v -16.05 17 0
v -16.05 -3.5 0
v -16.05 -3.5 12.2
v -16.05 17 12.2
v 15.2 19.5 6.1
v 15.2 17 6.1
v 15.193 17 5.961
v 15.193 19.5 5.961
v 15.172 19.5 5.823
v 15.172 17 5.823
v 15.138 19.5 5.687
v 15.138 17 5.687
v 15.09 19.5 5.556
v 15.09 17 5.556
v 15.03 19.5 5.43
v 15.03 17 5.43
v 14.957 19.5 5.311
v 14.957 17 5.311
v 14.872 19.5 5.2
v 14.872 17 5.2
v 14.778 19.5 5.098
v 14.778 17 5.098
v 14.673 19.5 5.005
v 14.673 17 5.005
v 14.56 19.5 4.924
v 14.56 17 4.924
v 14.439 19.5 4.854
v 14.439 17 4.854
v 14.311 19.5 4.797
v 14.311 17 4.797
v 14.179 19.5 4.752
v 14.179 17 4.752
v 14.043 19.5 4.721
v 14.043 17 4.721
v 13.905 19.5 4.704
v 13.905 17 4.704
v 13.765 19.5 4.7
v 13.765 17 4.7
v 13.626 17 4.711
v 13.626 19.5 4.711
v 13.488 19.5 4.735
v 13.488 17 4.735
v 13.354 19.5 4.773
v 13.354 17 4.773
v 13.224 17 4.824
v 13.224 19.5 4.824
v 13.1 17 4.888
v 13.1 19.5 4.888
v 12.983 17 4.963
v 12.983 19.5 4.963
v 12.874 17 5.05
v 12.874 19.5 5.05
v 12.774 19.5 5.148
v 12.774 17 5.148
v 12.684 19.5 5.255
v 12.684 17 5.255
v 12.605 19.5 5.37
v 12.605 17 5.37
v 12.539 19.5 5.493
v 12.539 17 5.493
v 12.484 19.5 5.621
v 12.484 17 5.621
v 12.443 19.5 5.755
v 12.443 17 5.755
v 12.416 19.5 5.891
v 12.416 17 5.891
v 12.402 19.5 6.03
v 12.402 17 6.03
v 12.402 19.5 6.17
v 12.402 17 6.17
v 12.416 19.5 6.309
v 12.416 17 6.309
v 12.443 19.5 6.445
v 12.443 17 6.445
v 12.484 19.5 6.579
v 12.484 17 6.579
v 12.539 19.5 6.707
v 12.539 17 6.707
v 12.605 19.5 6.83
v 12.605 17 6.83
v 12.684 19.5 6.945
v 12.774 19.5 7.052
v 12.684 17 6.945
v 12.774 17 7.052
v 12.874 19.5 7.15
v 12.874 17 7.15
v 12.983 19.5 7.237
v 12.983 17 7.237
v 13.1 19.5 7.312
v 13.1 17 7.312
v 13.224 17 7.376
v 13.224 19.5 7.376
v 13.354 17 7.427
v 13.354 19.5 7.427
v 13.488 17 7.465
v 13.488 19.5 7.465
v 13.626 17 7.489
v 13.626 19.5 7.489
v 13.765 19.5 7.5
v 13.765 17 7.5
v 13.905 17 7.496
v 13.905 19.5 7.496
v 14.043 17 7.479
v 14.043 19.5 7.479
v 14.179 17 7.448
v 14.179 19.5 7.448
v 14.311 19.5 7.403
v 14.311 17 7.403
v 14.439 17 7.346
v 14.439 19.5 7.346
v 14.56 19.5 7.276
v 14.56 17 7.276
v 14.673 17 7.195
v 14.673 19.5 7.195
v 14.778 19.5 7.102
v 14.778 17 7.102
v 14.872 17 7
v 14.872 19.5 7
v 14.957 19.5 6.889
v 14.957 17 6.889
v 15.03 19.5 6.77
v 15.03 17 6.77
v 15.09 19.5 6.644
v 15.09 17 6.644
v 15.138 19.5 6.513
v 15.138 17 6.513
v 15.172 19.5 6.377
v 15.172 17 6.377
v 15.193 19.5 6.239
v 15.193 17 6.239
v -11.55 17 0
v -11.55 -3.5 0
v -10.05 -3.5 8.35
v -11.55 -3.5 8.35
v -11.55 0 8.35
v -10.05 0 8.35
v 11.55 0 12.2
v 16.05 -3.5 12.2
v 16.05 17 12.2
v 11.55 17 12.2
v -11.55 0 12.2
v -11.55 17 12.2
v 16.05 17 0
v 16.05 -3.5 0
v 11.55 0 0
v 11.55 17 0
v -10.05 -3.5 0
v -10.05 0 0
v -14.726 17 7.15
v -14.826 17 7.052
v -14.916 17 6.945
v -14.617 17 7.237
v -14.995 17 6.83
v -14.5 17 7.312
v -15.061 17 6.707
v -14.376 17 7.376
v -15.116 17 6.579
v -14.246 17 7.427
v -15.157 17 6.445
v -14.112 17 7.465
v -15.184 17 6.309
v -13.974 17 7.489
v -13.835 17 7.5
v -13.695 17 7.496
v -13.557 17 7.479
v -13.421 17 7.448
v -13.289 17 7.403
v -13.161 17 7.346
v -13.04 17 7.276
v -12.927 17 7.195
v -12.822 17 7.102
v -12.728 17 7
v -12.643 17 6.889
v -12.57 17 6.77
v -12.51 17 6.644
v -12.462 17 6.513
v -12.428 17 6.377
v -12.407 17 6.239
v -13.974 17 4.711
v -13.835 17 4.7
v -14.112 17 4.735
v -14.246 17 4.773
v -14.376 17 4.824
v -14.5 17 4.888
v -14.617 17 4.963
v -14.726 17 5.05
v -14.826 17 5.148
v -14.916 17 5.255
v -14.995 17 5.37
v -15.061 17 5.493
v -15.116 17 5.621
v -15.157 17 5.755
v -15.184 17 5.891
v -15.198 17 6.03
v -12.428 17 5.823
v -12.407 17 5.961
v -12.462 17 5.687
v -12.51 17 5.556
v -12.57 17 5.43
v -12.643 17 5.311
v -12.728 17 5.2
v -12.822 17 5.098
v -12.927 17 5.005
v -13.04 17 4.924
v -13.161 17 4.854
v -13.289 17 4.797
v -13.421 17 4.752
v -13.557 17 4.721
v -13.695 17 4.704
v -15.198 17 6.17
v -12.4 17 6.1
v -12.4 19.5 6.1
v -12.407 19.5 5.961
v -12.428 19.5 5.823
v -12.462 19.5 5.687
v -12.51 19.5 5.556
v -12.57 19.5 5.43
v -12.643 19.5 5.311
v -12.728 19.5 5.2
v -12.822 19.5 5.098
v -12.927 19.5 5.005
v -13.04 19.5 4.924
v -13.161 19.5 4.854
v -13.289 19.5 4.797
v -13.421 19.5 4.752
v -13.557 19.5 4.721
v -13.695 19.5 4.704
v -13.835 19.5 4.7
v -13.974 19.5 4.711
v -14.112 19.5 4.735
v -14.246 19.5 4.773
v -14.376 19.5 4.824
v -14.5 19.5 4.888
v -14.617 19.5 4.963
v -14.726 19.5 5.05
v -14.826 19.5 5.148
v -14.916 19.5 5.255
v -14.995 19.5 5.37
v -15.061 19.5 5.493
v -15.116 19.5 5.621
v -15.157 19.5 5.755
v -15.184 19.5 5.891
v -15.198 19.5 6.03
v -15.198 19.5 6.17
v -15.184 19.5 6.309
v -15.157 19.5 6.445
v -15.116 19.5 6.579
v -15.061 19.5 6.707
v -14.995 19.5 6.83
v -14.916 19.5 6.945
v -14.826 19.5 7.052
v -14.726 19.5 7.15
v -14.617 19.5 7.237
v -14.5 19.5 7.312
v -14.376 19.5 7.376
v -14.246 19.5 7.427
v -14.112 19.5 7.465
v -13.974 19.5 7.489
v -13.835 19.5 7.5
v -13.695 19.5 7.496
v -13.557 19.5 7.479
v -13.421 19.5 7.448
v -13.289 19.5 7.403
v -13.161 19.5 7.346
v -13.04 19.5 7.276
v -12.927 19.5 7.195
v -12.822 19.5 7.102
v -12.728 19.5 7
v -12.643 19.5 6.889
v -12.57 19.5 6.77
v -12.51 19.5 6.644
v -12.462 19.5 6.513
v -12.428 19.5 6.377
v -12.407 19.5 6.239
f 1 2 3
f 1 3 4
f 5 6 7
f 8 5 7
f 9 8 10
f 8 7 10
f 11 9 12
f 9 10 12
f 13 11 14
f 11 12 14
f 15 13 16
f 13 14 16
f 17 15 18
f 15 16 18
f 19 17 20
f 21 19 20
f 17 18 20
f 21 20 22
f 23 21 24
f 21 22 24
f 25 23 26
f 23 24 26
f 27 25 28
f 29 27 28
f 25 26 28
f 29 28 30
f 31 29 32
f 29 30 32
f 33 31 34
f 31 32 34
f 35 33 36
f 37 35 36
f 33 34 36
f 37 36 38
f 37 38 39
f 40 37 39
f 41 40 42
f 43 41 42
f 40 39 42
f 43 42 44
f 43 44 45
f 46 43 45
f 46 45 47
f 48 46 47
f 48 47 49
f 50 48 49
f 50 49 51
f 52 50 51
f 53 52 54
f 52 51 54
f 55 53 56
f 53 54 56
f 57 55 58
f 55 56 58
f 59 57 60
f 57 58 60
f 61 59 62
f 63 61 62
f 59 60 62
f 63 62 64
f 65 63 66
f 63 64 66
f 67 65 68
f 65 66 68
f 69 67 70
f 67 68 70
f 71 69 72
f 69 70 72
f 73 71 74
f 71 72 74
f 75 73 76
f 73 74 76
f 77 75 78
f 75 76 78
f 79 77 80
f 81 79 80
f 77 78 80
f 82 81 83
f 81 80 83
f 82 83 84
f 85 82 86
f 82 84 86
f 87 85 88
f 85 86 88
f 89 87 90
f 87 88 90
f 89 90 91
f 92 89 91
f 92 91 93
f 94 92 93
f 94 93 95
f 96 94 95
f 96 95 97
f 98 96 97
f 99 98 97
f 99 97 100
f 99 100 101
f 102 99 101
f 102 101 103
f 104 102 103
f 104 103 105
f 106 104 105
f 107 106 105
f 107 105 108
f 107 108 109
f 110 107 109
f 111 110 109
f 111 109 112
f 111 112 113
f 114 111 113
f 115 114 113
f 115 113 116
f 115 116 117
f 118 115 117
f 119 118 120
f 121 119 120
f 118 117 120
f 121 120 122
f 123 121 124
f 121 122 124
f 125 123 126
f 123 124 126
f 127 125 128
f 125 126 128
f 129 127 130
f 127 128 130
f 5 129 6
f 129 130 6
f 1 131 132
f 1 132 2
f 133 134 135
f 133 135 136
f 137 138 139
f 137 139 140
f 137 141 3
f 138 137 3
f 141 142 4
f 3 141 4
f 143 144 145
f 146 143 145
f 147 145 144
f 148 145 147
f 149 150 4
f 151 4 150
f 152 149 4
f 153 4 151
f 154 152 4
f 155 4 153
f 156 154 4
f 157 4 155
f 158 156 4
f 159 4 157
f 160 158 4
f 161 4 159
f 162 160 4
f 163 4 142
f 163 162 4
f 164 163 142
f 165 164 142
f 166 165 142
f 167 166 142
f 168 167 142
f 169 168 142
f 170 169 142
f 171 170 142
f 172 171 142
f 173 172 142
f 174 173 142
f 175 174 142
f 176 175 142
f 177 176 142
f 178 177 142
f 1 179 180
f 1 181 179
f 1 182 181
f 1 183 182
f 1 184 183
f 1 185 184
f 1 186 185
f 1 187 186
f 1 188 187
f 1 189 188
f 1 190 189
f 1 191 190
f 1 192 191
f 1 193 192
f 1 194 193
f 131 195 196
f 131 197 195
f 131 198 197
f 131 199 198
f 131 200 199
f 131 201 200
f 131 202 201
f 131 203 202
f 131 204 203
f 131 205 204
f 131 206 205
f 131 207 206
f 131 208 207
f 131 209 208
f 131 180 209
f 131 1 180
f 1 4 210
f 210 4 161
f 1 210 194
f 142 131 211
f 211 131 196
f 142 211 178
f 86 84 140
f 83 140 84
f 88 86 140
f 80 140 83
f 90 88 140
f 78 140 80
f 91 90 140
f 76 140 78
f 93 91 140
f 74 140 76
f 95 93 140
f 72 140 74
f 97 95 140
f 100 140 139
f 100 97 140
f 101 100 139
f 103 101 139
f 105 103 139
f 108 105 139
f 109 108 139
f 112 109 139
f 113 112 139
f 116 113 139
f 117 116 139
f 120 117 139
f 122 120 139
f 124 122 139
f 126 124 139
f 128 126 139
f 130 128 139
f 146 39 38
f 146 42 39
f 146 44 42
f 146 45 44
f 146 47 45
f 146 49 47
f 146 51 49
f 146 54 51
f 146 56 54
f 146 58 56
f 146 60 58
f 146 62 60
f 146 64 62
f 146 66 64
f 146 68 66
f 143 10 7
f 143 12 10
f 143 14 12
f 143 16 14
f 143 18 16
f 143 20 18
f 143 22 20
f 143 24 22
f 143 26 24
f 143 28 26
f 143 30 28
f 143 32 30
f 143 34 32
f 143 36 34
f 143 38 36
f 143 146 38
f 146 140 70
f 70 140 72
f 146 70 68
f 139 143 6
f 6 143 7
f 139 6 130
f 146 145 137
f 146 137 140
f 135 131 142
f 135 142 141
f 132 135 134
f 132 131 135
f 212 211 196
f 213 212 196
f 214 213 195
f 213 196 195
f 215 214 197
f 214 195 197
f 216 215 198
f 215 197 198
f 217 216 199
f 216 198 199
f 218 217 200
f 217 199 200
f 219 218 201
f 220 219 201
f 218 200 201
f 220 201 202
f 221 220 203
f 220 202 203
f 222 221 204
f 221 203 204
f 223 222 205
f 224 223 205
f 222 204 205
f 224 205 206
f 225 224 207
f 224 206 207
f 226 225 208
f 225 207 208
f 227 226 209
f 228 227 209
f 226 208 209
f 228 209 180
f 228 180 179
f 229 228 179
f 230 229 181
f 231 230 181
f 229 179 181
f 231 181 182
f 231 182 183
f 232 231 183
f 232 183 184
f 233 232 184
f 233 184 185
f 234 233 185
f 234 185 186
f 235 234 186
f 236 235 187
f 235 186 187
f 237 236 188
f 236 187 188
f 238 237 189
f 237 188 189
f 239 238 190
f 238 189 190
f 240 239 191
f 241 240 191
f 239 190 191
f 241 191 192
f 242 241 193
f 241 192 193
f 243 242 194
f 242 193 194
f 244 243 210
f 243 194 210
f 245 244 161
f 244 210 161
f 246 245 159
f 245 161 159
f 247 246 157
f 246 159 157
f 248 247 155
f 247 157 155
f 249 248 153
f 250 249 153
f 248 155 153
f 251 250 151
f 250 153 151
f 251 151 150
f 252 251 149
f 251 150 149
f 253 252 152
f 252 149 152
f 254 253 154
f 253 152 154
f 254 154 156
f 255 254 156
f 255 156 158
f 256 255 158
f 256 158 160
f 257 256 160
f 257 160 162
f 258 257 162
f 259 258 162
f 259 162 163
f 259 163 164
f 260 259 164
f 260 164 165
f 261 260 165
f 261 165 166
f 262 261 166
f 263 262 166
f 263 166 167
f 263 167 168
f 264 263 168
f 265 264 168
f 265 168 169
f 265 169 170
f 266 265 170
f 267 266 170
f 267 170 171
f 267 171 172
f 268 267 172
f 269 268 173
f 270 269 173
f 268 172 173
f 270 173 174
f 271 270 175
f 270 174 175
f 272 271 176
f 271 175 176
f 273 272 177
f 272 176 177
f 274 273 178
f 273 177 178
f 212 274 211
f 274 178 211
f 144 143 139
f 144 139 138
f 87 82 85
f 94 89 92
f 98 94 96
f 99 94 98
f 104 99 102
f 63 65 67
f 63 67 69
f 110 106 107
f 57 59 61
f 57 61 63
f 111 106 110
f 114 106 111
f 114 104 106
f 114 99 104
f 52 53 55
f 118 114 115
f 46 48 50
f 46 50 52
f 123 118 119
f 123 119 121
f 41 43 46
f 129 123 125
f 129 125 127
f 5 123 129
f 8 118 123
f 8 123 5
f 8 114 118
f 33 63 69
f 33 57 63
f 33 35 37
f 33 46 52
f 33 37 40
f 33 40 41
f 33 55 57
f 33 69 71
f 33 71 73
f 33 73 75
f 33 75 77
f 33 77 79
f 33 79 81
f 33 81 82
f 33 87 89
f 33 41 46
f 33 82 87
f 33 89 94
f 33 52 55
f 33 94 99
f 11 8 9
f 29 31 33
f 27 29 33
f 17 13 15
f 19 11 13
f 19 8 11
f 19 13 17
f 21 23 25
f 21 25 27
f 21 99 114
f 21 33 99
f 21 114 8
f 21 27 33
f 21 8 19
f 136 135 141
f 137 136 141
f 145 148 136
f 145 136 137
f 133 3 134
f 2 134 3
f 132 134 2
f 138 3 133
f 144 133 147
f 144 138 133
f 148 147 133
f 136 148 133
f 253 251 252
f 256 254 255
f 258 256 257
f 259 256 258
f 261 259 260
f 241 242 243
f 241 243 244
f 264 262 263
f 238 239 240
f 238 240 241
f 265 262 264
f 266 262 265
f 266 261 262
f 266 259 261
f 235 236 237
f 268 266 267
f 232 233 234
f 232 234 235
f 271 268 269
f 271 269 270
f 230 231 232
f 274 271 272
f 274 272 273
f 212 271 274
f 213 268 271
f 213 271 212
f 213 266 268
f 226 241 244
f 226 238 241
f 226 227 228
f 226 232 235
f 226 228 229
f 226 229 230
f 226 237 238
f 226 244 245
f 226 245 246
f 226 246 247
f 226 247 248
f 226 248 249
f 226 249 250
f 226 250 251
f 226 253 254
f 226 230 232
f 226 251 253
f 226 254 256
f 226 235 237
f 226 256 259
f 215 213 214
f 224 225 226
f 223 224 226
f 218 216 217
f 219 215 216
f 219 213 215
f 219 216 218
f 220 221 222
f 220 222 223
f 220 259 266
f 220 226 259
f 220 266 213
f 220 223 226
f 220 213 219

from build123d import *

# Parameters (mm, degrees)
EXTRUDE_2_DEPTH          = 12.2
SKETCH_5_W               = 1.5
SKETCH_5_H               = 8.35
CUT_EXTRUDE_1_DEPTH      = 22.5
SKETCH_6_R               = 1.4
EXTRUDE_3_DEPTH          = 2.5
SKETCH_7_W               = 12.2
SKETCH_7_H               = 1
CUT_EXTRUDE_2_DEPTH      = 1
CUT_EXTRUDE_2_DEPTH_BACK = 32.1


with BuildPart() as part:
    # 草图4 → 凸台-拉伸2 (new body)
    with BuildSketch(Plane.XY):
        Polygon((-11.55, 0), (11.55, 0), (11.55, 17), (16.05, 17), (16.05, -4.5), (-16.05, -4.5), (-16.05, 17), (-11.55, 17), align=None)
    extrude(amount=EXTRUDE_2_DEPTH)

    # 草图5 → 切除-拉伸1 (cut, through all)
    with BuildSketch(Plane.XZ.offset(4.5)):
        with Locations((-10.8, 4.175)):
            Rectangle(SKETCH_5_W, SKETCH_5_H)
    extrude(amount=-CUT_EXTRUDE_1_DEPTH, mode=Mode.SUBTRACT)

    # 草图6 → 凸台-拉伸3 (add)
    with BuildSketch(Plane(origin=(0, 17, 0), x_dir=(1, 0, 0), z_dir=(0, 1, 0))):
        with Locations((13.8, -6.1)):
            Circle(SKETCH_6_R)
        with Locations((-13.8, -6.1)):
            Circle(SKETCH_6_R)
    extrude(amount=EXTRUDE_3_DEPTH)

    # 草图7 → 切除-拉伸2 (cut, two sides)
    with BuildSketch(Plane(origin=(16.05, 0, 0), x_dir=(0, 0, -1), z_dir=(1, 0, 0))) as cut_extrude_2_sk:
        with Locations((-6.1, -4)):
            Rectangle(SKETCH_7_W, SKETCH_7_H)
    extrude(amount=CUT_EXTRUDE_2_DEPTH, mode=Mode.SUBTRACT)
    extrude(cut_extrude_2_sk.sketch, amount=-CUT_EXTRUDE_2_DEPTH_BACK, mode=Mode.SUBTRACT)


solid = part.part
